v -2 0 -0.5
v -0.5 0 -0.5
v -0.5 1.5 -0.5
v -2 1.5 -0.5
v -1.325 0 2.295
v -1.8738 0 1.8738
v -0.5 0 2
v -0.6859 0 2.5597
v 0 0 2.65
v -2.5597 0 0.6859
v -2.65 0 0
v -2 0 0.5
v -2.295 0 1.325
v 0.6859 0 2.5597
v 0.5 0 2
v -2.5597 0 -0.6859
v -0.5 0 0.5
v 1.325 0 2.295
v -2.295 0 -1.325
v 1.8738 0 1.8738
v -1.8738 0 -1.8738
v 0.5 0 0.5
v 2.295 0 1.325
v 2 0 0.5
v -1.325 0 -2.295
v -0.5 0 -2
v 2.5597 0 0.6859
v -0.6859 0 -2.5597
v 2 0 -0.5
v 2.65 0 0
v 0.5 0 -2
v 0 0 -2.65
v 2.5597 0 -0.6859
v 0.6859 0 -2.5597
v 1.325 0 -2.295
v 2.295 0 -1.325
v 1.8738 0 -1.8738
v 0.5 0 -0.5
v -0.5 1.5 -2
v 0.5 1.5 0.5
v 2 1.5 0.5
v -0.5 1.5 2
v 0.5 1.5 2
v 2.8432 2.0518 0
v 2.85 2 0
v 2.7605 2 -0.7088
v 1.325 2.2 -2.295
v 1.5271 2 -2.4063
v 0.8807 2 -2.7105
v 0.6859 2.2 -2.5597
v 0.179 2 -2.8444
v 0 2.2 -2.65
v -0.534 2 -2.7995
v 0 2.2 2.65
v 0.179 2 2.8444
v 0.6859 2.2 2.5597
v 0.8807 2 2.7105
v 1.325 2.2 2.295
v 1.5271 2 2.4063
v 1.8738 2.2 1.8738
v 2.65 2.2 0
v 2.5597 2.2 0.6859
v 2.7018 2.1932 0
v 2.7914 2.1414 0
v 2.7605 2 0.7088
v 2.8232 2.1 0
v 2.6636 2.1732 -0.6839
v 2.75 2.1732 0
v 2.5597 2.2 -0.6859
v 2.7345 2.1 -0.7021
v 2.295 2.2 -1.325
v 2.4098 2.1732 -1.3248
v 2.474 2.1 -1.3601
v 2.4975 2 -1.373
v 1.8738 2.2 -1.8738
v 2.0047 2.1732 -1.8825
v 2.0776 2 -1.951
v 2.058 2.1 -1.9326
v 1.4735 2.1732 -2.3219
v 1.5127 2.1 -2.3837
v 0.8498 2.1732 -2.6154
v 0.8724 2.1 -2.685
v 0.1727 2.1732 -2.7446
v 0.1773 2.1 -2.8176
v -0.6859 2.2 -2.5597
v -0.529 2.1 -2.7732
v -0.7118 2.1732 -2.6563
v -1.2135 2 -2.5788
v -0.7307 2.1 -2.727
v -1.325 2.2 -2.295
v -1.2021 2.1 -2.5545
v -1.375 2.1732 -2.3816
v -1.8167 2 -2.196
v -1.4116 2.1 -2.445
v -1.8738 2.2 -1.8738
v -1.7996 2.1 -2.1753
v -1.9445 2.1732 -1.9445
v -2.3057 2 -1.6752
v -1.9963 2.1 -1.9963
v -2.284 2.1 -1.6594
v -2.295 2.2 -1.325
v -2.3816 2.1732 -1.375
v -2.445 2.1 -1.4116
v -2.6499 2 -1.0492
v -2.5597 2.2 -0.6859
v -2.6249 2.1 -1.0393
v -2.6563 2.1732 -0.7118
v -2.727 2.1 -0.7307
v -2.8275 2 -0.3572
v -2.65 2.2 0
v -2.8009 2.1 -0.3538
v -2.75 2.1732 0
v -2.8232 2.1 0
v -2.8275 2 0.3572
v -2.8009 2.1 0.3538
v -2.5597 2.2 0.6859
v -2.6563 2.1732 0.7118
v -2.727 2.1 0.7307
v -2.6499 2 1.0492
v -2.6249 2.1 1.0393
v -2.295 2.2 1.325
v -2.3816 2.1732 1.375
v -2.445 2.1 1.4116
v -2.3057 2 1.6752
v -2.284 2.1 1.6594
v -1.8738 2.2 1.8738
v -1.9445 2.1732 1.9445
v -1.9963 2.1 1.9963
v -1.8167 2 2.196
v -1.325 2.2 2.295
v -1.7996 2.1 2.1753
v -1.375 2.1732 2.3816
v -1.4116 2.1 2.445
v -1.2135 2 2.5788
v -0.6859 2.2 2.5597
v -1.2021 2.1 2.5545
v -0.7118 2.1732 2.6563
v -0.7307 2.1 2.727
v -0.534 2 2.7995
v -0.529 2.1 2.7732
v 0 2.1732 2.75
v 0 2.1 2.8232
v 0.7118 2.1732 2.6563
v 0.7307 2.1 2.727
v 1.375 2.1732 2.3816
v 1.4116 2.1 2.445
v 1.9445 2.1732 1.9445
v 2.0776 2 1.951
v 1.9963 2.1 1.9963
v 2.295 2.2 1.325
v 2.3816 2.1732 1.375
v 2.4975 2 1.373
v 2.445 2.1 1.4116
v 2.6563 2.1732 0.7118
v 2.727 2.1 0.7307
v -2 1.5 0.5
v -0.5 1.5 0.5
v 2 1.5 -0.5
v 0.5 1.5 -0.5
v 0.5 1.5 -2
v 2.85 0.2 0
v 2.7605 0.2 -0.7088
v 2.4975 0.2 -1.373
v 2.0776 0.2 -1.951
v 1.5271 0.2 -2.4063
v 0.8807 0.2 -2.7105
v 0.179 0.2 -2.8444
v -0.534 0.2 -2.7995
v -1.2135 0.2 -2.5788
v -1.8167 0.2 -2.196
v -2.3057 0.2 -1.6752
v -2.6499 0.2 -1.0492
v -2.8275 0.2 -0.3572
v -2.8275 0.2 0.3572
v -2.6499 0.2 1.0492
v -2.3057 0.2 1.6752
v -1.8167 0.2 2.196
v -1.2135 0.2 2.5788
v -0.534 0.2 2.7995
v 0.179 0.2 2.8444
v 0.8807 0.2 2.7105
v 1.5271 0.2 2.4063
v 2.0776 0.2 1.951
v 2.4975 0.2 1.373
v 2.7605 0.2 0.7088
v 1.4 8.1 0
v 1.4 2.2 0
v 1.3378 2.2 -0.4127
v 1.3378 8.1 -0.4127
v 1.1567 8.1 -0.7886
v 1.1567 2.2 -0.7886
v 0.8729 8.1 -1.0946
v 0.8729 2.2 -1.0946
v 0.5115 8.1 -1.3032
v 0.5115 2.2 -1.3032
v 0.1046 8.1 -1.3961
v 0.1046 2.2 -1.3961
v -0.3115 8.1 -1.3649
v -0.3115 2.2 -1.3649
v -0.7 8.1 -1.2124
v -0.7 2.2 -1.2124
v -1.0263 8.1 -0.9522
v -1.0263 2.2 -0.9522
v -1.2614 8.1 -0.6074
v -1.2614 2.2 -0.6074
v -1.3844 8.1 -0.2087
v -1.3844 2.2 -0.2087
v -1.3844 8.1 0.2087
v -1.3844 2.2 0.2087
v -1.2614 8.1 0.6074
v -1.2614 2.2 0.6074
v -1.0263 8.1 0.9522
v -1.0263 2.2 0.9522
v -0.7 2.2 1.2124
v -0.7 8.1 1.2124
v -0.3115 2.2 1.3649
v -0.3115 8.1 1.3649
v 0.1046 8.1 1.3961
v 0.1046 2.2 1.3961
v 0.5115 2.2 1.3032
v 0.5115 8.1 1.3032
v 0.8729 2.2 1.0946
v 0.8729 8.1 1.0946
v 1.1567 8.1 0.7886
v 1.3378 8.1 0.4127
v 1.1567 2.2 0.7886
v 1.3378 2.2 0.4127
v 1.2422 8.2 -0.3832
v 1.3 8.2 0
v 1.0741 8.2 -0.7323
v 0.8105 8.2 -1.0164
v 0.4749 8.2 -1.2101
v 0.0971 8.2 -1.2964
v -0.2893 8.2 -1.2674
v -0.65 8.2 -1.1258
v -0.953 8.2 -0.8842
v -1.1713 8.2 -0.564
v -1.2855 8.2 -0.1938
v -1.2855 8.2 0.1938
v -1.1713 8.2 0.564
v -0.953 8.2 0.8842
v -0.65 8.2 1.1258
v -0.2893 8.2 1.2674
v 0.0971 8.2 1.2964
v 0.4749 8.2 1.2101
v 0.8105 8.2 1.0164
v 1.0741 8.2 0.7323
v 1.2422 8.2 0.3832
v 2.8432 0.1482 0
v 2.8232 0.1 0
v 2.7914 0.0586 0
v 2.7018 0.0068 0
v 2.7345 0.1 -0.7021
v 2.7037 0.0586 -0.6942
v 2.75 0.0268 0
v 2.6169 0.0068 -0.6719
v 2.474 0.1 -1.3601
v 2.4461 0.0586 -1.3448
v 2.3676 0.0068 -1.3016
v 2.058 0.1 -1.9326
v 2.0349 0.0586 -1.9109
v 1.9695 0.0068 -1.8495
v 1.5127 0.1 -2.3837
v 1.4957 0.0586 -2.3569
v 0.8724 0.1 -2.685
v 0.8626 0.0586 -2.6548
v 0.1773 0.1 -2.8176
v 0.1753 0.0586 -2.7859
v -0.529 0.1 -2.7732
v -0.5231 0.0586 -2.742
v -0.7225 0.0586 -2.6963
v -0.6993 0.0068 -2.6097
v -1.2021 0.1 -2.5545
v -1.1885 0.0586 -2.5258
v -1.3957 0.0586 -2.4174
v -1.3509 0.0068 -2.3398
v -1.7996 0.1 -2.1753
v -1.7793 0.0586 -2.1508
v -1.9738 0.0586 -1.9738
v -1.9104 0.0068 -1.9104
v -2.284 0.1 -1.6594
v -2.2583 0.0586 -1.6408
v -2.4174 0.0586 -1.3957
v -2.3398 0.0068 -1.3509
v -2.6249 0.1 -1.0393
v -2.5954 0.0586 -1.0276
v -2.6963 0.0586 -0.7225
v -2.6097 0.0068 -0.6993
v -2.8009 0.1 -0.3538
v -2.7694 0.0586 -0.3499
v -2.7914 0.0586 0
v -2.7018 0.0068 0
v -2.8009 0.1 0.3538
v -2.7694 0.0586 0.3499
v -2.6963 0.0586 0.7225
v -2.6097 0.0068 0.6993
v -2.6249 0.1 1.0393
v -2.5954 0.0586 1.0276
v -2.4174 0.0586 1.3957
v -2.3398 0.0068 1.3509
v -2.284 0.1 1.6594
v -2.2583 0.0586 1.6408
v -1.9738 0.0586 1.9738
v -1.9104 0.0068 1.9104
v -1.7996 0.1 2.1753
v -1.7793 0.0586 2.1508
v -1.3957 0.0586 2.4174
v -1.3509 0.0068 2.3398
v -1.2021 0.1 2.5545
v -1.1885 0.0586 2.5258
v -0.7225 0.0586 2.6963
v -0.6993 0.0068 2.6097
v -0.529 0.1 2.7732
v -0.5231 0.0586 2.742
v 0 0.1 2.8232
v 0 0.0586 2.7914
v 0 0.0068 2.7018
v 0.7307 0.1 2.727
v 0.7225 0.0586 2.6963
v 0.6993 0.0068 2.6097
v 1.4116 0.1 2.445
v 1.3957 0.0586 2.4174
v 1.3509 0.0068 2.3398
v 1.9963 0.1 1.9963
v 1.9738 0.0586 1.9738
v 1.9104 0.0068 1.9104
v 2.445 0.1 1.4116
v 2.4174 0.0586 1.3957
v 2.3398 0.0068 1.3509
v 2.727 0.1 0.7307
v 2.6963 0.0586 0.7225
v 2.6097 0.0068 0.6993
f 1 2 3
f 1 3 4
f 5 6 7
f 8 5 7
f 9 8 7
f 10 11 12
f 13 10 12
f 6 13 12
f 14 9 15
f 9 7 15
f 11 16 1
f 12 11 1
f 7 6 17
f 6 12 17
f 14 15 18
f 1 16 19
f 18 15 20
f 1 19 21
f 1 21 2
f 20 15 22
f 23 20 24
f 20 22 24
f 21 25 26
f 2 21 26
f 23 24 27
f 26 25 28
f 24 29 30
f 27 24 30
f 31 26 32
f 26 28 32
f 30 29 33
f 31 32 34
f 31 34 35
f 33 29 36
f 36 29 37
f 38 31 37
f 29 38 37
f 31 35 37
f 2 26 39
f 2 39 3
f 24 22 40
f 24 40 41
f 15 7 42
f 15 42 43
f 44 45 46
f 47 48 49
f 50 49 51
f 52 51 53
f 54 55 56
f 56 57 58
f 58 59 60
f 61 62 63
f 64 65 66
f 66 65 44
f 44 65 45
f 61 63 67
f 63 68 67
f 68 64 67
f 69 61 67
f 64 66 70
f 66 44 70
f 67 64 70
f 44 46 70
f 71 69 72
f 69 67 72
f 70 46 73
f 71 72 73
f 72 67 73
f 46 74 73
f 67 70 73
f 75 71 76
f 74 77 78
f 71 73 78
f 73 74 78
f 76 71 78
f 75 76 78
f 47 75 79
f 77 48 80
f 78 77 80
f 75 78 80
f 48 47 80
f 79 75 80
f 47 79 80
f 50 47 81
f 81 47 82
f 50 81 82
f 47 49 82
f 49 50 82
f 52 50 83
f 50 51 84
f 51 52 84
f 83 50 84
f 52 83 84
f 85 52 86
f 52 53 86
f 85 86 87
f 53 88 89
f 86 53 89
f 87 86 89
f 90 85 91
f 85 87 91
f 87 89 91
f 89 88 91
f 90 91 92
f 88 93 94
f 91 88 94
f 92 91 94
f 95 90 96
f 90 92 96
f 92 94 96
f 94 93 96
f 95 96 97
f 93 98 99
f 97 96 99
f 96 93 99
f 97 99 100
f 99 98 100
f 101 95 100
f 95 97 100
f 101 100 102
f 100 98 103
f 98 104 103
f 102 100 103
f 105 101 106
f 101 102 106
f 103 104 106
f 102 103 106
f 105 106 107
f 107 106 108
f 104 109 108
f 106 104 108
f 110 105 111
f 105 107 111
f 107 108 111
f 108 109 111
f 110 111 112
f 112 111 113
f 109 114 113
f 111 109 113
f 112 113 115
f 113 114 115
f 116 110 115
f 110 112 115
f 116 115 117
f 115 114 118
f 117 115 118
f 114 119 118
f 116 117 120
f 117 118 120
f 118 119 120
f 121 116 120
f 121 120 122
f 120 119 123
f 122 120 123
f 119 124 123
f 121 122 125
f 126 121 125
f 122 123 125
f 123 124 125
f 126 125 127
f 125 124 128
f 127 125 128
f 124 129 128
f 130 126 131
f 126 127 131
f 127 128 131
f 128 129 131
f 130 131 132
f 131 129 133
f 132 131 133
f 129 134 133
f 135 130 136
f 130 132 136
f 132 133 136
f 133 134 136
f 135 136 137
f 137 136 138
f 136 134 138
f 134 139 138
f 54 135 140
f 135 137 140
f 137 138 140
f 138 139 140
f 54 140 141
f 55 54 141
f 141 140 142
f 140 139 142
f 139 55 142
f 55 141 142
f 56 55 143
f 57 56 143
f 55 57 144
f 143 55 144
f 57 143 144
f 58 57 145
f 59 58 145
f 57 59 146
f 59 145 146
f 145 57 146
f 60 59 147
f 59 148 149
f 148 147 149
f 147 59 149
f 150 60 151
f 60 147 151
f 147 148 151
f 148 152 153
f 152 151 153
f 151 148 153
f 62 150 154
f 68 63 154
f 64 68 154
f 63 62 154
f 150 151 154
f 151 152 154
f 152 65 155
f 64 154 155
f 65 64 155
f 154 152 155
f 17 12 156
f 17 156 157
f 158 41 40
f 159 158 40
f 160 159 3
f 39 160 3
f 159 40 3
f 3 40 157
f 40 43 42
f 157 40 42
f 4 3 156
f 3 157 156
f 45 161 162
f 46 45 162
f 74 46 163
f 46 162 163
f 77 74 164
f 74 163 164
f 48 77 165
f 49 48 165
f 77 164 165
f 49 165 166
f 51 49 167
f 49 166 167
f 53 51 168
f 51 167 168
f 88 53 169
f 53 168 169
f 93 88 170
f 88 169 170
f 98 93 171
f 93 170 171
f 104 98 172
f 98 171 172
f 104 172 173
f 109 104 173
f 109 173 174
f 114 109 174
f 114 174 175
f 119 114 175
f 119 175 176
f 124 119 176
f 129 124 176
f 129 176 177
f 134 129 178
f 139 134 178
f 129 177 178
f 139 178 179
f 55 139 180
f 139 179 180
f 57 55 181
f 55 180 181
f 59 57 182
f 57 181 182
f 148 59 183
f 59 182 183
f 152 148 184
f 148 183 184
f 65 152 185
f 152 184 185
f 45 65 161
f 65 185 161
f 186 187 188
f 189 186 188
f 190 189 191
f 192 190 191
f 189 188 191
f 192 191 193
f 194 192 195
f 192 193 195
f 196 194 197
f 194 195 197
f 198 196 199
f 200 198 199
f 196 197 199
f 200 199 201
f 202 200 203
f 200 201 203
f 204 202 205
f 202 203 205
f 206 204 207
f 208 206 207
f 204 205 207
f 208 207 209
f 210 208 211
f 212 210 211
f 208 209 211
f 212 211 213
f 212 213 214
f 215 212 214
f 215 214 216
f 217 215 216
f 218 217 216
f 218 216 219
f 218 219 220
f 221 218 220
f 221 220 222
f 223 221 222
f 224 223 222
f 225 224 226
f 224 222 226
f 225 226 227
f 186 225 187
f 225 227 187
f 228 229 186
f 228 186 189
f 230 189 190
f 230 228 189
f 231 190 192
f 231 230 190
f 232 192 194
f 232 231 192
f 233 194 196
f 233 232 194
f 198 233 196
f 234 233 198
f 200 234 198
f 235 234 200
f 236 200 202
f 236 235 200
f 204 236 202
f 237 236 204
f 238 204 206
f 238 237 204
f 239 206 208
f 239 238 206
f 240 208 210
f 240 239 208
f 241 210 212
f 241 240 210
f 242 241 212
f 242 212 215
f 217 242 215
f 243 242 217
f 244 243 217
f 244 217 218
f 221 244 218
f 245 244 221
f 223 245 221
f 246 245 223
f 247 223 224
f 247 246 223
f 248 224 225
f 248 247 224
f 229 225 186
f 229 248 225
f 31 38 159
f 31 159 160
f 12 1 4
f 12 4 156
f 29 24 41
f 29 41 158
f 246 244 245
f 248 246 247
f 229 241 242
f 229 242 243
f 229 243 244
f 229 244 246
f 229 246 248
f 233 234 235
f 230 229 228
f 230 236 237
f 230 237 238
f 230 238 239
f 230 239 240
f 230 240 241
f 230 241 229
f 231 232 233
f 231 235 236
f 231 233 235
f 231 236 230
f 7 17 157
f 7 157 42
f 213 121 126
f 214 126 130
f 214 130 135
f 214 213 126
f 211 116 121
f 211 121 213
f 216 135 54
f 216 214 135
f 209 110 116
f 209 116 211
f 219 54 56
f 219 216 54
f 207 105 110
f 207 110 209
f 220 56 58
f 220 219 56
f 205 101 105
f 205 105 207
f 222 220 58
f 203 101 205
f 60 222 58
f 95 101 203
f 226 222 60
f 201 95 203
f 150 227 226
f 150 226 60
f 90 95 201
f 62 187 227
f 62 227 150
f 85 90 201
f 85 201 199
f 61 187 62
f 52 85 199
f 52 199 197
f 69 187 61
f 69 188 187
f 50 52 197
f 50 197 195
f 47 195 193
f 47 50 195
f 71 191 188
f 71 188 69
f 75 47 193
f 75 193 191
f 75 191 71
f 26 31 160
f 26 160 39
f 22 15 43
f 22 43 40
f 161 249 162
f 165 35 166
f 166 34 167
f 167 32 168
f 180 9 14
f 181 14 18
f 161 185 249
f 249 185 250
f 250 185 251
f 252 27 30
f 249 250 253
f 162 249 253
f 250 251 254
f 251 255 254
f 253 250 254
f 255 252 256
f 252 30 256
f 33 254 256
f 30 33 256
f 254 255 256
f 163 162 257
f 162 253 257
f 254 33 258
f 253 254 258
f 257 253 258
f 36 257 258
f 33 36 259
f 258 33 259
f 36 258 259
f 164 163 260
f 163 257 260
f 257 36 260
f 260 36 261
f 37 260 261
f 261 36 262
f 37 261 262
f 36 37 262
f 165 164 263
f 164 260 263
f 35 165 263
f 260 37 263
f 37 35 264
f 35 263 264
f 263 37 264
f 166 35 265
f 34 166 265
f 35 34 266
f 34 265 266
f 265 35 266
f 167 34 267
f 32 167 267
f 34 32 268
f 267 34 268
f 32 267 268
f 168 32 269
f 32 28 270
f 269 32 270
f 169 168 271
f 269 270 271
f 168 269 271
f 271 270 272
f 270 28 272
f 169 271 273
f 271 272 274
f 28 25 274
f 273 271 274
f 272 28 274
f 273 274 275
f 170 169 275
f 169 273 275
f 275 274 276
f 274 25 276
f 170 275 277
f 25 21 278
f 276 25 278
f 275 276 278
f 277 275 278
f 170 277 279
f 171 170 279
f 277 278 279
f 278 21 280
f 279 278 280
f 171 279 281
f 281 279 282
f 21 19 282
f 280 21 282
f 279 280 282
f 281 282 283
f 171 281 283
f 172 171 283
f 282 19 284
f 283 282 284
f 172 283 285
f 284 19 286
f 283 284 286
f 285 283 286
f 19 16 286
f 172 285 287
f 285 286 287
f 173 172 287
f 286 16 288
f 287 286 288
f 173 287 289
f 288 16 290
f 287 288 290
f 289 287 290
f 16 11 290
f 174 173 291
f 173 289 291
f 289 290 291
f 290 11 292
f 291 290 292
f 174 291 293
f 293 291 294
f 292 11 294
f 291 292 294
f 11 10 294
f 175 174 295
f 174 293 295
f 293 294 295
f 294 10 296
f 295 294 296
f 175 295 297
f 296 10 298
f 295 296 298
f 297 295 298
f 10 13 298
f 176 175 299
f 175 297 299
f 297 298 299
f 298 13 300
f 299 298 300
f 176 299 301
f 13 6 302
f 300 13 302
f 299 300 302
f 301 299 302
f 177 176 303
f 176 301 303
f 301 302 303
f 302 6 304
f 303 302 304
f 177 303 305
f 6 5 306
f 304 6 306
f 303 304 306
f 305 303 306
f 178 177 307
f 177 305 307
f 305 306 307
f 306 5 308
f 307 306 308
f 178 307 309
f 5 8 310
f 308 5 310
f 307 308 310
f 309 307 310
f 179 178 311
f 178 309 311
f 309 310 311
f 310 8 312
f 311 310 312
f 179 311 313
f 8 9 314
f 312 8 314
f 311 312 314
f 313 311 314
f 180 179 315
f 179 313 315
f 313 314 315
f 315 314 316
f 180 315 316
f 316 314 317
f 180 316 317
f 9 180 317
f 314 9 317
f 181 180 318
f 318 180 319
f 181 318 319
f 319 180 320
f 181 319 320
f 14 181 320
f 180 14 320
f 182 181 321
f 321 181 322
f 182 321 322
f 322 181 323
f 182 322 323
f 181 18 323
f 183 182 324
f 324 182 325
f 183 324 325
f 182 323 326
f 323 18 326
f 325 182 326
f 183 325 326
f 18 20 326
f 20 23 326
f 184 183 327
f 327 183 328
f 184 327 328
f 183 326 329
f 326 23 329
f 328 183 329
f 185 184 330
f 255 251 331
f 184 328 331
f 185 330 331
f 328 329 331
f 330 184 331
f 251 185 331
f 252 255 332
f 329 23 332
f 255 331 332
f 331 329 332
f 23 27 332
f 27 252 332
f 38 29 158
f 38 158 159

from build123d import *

# Parameters (mm, degrees)
SKETCH_1_R          = 2.85
EXTRUDE_1_DEPTH     = 2.2
SKETCH_2_R          = 1.4
EXTRUDE_2_DEPTH     = 6
CHAMFER_1_SIZE      = 0.1
FILLET_1_R          = 0.2
CUT_EXTRUDE_1_DEPTH = 1.5


with BuildPart() as part:
    # Эскиз1 → Бобышка-Вытянуть1 (new body)
    with BuildSketch(Plane(origin=(0, 0, 0), x_dir=(1, 0, 0), z_dir=(0, 1, 0))):
        Circle(SKETCH_1_R)
    extrude(amount=EXTRUDE_1_DEPTH)

    # Эскиз2 → Бобышка-Вытянуть2 (add)
    with BuildSketch(Plane(origin=(0, 2.2, 0), x_dir=(1, 0, 0), z_dir=(0, 1, 0))):
        Circle(SKETCH_2_R)
    extrude(amount=EXTRUDE_2_DEPTH)

    # Фаска1
    chamfer_1_edges = [part.edges().sort_by_distance(p)[0] for p in [
        (-1.4, 8.2, 0),
    ]]
    chamfer(chamfer_1_edges, length=CHAMFER_1_SIZE)

    # Скругление1
    fillet_1_edges = [part.edges().sort_by_distance(p)[0] for p in [
        (-2.85, 0, 0),
        (-2.85, 2.2, 0),
    ]]
    fillet(fillet_1_edges, radius=FILLET_1_R)

    # Эскиз3 → Вырез-Вытянуть1 (cut)
    with BuildSketch(Plane.XZ):
        Polygon((-0.5, 0.5), (-0.5, 2), (0.5, 2), (0.5, 0.5), (2, 0.5), (2, -0.5), (0.5, -0.5), (0.5, -2), (-0.5, -2), (-0.5, -0.5), (-2, -0.5), (-2, 0.5), align=None)
    extrude(amount=-CUT_EXTRUDE_1_DEPTH, mode=Mode.SUBTRACT)


solid = part.part
